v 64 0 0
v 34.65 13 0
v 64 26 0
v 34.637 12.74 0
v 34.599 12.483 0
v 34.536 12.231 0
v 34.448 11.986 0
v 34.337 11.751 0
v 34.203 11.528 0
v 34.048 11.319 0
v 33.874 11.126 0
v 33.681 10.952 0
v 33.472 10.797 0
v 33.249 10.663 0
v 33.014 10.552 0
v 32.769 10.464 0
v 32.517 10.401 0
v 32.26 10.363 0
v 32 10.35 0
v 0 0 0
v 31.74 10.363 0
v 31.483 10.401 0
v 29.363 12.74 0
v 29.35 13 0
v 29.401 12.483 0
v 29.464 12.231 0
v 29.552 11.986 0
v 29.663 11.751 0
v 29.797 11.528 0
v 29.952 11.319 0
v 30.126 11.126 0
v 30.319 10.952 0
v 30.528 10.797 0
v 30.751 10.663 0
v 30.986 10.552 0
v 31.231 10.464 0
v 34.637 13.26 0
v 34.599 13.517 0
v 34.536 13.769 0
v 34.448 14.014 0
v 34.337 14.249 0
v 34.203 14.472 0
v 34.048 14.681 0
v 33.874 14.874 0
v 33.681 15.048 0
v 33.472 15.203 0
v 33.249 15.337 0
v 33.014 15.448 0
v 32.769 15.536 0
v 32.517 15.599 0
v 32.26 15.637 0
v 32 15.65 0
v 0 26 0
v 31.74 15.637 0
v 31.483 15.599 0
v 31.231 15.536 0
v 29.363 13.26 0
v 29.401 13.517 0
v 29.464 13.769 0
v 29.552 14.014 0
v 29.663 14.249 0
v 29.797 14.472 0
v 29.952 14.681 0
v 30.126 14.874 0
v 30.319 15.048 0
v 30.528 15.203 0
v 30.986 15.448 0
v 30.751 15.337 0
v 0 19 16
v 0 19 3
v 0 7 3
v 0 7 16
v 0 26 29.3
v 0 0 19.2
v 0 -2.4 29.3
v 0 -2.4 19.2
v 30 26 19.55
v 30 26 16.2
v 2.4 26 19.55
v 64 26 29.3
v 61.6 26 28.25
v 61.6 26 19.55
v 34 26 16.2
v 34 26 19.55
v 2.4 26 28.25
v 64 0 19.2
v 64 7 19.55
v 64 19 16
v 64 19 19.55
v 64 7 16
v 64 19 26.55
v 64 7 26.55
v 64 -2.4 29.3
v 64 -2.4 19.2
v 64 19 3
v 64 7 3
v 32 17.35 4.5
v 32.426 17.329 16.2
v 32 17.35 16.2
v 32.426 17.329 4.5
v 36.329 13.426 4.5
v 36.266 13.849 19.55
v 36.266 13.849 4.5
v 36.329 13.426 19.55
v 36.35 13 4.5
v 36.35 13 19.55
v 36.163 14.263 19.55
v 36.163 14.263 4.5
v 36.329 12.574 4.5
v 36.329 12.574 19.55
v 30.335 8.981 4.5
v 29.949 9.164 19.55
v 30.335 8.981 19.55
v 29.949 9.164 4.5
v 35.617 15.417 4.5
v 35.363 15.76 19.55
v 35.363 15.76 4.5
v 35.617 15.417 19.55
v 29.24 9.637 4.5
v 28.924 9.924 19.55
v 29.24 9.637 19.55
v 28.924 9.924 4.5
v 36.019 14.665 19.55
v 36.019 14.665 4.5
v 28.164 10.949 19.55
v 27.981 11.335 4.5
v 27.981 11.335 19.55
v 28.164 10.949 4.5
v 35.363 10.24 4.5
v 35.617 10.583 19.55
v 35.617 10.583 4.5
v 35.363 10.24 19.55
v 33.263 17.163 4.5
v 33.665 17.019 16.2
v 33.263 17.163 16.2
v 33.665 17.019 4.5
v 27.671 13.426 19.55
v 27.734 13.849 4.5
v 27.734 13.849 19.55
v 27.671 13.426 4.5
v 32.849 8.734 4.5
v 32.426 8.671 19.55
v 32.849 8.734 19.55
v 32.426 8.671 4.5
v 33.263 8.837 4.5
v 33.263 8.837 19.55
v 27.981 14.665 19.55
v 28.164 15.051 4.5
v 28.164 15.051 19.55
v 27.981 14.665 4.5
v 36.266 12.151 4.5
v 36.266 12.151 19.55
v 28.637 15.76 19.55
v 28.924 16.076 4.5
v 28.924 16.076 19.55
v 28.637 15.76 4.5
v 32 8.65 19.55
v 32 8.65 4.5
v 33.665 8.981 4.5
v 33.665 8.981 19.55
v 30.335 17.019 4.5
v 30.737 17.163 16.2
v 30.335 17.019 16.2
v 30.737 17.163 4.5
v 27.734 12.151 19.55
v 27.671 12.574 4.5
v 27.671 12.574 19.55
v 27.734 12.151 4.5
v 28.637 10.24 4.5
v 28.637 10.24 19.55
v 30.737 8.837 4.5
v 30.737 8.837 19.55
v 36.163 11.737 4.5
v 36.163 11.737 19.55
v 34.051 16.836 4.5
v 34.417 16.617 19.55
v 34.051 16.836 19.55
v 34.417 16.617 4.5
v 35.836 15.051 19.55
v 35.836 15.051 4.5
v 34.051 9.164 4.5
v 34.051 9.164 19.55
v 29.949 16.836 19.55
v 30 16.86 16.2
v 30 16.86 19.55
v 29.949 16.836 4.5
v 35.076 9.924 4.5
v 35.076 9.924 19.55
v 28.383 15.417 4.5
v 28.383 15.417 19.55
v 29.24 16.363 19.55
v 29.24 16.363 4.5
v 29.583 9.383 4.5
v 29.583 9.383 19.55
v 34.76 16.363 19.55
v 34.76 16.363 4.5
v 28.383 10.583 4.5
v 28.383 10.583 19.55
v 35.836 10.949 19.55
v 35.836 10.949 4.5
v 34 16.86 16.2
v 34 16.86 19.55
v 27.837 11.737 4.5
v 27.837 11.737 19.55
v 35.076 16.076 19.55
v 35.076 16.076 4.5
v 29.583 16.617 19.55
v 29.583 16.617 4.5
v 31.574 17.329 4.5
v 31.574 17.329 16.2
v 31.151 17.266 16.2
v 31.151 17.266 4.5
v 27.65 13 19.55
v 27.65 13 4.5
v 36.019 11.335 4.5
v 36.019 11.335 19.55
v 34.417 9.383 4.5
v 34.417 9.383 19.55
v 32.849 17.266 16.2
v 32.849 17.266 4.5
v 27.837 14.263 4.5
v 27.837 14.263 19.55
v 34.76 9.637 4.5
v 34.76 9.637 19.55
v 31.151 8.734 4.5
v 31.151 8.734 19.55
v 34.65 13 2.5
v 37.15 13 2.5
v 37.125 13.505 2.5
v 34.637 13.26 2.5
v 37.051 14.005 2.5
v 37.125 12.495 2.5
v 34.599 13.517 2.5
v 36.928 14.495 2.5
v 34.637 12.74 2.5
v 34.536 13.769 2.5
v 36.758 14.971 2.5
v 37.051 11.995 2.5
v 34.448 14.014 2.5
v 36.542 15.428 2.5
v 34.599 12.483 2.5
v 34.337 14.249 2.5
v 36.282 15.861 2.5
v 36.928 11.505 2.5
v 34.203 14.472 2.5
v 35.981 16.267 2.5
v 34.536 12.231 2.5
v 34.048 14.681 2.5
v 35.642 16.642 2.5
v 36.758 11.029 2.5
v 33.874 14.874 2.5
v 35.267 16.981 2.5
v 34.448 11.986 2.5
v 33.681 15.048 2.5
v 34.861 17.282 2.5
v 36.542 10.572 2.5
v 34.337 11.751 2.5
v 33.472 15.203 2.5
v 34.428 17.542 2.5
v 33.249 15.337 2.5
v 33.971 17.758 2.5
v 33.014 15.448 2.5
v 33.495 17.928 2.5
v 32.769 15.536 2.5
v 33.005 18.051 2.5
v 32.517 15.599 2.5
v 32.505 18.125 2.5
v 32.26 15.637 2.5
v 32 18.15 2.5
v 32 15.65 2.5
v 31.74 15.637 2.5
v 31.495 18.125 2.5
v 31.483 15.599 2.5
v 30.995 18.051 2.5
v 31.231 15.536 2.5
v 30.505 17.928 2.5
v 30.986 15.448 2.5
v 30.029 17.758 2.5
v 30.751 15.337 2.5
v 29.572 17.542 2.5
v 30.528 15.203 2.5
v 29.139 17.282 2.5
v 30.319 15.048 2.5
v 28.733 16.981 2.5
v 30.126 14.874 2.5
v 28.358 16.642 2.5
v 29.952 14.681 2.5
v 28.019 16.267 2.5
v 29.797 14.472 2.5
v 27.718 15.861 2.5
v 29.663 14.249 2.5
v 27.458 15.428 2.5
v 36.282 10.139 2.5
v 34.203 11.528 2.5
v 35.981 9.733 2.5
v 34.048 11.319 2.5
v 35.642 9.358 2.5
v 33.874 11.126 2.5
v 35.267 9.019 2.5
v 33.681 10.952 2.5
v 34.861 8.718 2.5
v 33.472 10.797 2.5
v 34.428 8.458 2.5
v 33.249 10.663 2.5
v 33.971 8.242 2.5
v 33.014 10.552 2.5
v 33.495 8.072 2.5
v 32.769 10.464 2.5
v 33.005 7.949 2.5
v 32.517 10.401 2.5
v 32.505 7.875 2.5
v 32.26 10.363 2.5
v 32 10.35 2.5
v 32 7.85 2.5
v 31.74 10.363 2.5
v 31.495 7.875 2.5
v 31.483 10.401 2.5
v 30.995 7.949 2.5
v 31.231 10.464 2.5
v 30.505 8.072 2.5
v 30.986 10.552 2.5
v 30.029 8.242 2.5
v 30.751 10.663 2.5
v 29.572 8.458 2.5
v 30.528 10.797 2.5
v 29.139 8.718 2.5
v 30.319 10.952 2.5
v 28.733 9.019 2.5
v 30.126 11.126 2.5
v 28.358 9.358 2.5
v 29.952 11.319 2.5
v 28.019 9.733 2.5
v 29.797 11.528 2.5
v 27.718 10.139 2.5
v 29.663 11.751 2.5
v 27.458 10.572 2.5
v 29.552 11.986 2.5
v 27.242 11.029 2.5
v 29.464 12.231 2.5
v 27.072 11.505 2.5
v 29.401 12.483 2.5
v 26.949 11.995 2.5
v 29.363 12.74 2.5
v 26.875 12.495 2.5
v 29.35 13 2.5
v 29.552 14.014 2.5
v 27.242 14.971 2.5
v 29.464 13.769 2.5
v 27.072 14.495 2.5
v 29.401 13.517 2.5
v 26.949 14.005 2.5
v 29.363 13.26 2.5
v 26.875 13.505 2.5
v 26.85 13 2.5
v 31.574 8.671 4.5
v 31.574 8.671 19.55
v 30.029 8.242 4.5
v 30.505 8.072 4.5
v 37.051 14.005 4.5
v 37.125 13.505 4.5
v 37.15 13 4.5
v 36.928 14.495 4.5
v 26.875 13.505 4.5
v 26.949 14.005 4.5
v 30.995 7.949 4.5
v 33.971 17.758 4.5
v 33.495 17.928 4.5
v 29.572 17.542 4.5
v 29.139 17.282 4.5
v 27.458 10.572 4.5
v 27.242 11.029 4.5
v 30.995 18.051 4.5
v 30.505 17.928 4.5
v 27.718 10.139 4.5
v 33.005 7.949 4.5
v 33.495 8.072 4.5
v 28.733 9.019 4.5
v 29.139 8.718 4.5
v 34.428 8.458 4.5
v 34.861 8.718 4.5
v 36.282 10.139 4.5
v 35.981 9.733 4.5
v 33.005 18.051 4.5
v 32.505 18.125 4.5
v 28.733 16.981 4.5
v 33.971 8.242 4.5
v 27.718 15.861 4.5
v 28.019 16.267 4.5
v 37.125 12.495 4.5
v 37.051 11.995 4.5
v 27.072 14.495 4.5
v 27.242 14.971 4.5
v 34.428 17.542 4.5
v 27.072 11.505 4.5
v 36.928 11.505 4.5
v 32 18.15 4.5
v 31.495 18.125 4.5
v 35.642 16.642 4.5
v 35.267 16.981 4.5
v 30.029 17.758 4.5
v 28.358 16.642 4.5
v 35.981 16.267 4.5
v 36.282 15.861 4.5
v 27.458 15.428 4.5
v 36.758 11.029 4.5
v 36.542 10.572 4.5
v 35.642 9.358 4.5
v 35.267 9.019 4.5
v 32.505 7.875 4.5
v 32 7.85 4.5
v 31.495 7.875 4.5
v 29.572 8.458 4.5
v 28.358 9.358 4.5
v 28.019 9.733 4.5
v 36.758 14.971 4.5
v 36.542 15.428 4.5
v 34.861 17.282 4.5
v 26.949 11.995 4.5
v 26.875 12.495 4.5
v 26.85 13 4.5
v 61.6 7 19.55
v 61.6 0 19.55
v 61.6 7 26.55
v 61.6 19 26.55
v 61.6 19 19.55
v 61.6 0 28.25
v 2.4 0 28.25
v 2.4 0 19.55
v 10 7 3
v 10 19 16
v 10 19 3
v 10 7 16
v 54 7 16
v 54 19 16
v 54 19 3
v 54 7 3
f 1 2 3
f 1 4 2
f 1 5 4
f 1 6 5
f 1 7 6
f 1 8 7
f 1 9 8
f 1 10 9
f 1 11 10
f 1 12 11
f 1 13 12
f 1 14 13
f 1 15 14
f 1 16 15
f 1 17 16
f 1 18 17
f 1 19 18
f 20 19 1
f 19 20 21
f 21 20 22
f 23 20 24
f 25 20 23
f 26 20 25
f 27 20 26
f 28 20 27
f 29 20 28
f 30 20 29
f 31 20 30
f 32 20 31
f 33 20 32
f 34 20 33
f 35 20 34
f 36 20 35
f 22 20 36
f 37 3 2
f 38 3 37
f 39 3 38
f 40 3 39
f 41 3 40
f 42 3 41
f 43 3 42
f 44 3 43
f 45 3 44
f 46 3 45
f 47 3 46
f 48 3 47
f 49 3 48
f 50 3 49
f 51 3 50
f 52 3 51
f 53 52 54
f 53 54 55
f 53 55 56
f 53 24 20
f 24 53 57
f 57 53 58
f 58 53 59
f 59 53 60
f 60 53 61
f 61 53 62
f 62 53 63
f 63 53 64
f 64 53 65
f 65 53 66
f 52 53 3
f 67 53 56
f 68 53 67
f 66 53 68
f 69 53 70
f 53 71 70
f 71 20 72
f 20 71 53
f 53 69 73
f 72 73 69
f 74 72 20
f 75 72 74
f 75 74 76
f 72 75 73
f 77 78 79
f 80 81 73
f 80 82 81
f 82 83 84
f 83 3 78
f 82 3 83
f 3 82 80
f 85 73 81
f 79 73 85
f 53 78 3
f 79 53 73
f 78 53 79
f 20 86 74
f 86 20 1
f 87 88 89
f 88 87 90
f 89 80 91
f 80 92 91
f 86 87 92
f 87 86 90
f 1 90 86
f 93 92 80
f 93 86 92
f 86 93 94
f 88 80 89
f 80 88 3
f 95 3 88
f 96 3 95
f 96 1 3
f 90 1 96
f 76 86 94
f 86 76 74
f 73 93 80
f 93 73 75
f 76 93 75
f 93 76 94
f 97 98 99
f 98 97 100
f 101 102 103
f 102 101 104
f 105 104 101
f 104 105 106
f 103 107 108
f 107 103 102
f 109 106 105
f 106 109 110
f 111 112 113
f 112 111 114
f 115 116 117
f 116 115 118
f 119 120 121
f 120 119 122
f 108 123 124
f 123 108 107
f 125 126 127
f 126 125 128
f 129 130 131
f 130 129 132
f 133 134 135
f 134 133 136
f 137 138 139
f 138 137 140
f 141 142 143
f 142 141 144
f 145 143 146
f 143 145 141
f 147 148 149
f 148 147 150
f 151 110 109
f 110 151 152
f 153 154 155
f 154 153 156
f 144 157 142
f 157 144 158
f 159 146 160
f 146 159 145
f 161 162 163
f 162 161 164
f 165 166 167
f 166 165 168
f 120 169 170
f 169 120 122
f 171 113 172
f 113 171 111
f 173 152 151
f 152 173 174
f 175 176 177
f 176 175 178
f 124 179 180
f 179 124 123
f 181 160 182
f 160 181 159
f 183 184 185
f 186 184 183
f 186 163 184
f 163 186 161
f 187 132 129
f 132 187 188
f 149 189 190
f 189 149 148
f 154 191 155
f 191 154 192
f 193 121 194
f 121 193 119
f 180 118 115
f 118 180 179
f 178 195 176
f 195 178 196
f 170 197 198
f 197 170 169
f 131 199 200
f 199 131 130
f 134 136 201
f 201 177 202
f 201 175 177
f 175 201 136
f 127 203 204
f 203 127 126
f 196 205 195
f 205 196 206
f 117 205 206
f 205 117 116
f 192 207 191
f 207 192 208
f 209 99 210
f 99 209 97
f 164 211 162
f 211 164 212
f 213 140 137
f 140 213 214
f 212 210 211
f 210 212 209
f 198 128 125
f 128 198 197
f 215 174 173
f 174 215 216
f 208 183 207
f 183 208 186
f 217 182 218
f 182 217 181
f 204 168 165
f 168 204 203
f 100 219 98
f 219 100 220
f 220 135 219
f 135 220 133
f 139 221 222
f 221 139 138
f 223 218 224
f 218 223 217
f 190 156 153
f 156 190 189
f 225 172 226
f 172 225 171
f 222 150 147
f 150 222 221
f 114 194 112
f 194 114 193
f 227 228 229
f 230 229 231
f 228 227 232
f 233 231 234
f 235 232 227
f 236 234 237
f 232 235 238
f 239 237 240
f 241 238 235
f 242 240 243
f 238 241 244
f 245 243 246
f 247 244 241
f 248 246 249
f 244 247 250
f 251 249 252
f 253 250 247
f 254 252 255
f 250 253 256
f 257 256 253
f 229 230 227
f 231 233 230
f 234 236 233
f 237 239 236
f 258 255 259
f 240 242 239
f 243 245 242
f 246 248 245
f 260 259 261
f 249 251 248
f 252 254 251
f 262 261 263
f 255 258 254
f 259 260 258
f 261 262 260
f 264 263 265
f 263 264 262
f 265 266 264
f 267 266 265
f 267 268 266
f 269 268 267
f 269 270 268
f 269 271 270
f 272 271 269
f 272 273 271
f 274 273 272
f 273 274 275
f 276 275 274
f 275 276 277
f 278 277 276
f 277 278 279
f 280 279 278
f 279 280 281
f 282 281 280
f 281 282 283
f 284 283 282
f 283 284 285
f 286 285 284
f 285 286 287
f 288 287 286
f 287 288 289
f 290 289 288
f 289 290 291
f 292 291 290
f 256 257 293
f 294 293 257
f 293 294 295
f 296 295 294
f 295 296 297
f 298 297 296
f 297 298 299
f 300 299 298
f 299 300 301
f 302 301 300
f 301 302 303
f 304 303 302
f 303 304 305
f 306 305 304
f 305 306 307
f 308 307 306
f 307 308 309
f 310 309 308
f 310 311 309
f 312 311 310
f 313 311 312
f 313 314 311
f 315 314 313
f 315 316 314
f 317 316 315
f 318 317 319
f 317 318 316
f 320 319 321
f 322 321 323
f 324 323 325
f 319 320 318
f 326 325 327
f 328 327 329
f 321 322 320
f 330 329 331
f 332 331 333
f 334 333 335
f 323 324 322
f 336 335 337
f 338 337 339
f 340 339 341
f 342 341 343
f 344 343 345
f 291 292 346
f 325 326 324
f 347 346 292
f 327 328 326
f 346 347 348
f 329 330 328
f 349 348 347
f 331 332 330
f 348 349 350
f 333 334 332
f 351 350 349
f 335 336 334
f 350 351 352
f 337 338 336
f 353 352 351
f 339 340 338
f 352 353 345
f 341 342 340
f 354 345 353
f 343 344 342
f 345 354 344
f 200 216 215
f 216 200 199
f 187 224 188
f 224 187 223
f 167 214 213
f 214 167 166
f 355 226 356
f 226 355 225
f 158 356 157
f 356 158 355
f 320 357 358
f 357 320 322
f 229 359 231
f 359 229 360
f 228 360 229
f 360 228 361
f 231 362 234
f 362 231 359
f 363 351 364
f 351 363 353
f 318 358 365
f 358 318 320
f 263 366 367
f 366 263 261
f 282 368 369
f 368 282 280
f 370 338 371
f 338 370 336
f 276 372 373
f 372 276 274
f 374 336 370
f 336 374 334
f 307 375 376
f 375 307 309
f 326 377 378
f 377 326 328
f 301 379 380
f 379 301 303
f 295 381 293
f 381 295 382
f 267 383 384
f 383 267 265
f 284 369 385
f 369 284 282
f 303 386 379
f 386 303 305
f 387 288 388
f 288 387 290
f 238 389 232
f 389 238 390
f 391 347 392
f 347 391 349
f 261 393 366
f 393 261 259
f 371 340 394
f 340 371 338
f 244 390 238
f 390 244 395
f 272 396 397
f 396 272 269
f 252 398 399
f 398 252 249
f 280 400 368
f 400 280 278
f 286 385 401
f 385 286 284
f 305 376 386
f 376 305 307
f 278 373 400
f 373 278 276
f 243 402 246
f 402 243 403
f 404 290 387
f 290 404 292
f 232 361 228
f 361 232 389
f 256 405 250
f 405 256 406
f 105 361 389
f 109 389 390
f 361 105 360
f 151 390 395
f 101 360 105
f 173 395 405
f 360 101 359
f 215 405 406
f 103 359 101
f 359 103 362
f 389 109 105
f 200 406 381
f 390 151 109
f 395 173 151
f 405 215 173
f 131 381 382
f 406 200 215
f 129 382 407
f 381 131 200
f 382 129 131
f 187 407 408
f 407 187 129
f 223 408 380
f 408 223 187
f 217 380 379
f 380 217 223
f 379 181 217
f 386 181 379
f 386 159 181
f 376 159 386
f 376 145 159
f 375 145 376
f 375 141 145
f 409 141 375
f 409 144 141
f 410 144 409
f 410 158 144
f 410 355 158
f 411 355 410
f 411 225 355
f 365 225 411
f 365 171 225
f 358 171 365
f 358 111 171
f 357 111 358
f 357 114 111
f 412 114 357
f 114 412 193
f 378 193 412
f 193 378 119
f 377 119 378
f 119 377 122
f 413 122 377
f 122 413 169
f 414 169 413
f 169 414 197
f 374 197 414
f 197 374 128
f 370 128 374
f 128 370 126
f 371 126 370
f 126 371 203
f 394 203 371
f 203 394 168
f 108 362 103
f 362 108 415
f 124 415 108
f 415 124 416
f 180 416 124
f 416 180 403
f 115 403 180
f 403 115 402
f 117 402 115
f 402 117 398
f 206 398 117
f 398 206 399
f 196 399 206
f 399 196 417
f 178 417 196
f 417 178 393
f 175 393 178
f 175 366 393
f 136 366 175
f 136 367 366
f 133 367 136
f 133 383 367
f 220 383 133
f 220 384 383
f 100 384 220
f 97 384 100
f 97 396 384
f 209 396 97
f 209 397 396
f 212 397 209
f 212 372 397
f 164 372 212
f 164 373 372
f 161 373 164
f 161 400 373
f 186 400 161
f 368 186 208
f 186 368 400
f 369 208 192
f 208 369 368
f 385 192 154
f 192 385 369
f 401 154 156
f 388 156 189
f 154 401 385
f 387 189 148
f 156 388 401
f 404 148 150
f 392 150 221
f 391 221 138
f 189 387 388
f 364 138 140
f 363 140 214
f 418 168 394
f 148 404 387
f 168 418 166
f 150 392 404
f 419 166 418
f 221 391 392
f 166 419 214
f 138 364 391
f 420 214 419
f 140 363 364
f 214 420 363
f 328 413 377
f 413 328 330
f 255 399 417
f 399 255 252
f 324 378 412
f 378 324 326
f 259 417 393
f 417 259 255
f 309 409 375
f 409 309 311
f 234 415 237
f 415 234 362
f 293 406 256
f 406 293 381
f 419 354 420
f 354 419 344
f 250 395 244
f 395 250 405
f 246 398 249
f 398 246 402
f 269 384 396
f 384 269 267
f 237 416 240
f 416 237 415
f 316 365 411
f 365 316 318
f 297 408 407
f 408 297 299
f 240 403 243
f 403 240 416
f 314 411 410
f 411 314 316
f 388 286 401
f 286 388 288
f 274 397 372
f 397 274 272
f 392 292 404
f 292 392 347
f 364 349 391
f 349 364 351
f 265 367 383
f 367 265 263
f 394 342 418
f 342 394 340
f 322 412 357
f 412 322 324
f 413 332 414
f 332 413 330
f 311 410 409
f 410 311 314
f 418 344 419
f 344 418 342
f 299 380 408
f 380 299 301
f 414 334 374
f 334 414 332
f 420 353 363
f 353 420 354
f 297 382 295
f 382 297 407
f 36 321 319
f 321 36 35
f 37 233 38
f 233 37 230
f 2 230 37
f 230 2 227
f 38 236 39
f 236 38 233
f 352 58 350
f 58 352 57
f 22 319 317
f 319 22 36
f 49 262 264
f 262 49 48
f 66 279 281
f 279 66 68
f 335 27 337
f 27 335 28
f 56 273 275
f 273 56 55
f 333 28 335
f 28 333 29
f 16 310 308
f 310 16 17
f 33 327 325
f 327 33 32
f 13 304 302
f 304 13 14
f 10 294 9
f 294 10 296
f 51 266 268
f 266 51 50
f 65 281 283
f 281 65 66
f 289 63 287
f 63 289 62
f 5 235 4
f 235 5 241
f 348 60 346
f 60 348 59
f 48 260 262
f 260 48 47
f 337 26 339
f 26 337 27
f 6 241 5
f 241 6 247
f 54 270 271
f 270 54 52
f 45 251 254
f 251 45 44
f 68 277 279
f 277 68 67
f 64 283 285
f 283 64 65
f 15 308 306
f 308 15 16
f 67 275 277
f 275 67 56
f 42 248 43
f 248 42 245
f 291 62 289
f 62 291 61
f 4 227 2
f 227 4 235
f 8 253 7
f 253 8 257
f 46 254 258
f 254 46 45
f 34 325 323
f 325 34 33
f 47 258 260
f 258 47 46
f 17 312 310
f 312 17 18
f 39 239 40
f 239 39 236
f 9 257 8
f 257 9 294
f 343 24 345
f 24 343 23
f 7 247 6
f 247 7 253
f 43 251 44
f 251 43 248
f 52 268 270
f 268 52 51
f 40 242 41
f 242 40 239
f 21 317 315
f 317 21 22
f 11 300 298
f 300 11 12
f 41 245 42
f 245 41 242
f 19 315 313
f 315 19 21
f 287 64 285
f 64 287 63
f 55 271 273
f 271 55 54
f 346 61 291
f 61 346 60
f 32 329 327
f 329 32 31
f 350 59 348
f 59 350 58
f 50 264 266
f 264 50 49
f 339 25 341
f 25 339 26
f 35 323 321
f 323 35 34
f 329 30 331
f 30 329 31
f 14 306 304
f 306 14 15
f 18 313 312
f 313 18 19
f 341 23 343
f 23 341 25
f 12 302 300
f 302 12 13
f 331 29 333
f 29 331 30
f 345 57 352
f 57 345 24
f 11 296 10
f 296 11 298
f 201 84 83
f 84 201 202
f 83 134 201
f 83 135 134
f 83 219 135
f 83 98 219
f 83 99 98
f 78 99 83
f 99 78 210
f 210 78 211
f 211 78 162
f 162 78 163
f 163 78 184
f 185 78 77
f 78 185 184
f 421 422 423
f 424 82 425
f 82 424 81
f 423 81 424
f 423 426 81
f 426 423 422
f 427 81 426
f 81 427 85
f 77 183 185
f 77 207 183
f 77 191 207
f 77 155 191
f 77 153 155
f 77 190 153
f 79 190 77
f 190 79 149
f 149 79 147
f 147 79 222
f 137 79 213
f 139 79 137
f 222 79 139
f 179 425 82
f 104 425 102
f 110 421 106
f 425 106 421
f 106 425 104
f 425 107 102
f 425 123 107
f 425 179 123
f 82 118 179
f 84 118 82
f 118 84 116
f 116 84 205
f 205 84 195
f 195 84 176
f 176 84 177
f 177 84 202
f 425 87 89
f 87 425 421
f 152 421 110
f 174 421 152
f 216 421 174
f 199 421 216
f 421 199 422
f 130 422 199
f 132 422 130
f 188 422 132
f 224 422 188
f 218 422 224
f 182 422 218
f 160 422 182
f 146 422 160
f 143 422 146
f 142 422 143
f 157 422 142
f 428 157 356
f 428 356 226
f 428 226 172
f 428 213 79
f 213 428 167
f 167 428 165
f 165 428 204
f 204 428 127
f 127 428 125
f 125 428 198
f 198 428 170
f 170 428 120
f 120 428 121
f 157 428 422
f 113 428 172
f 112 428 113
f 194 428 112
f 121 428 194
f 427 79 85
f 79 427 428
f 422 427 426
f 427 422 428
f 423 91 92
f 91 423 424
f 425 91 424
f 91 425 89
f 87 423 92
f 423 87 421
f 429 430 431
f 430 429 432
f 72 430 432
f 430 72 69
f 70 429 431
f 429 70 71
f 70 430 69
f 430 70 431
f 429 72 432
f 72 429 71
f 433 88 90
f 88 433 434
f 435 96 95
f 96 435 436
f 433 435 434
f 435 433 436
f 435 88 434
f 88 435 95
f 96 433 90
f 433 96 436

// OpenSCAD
// power_bridge.scad —— WiFi 开机器一体化外壳（微型电磁铁版）
// ================================================================
// 用法：
//   1. 装 OpenSCAD（免费开源：openscad.org）
//   2. 实测你的笔记本后修改下方参数（每个参数都有注释教你怎么量）
//   3. F5 预览 → F6 渲染 → 导出 STL → 切片打印
// 材料建议：PLA，0.2mm 层高，3 层壁，20% 填充，无需支撑
// 公差：孔/槽尺寸已含 0.35mm 配合公差，首版打印后按松紧微调 tol
//
// 设计要点：桥形结构 = 天然机械限位
//   电磁铁竖装在桥体中央，推杆只有上下一个运动自由度，
//   物理上不存在横扫/侧滑，是执行器安全的终极形态。

$fn = 64;

/* ====== 1. 桥体尺寸（拿直尺实测后修改） ====== */
span   = 46;   // 两脚柱内侧跨距：电源键宽度 + 两侧各留 ≥8mm 落胶面
depth  = 26;   // 前后深度：覆盖按键区即可
foot_h = 16;   // 脚柱高：跨过键盘面板与键面的高度差 + 3mm 余量
foot_w = 9;    // 脚柱宽度
top_t  = 3.2;  // 顶板厚度（3 层壁）

/* ====== 2. 电磁铁参数（到手后用卡尺实测核对） ====== */
// 型号 ZYE1-P08/15：筒身 Φ8×15.5mm，一端带法兰
sol_d    = 8.0;   // 筒身直径
sol_l    = 15.5;  // 总长（含法兰）
flange_d = 9.6;   // 法兰直径（法兰朝下，挂在筒底沉槽上）
push_d   = 3.9;   // 推杆直径

/* ====== 3. ESP32-S3 托盘（按你的板实测） ====== */
esp_l  = 55;   // 板长（含 USB 口那端）
esp_w  = 26;   // 板宽
esp_h  = 7;    // 板厚 + 正面元件最高点
usb_w  = 12;   // USB 口开槽宽
usb_h  = 7;    // USB 口开槽高

/* ====== 4. 公差与壁厚 ====== */
tol    = 0.35;  // FDM 配合公差：装不进就调大，太松就调小
wall_t = 2.4;   // 筒壁/托盘墙厚（3 层壁）

/* ====== 派生尺寸，勿改 ====== */
total_l  = span + 2 * foot_w;   // 桥体总长
cx       = total_l / 2;         // 电磁铁中心 x（跨中 = 键中心上方）
cy       = depth / 2;
tube_bot = 2.5;                 // 筒底离键面的净空（推杆行程 + 键程的余量）
gap_h    = foot_h - tube_bot;   // 筒身露出顶板以下的高度

difference() {
  union() {
    /* ---- 两只脚柱 ---- */
    cube([foot_w, depth, foot_h]);
    translate([total_l - foot_w, 0, 0])
      cube([foot_w, depth, foot_h]);

    /* ---- 顶板（横跨） ---- */
    cube([total_l, depth, foot_h + top_t]);

    /* ---- 电磁铁外筒（挂在顶板下方，跨中） ---- */
    translate([cx, cy, tube_bot])
      cylinder(d = sol_d + 2 * wall_t + 1, h = gap_h);

    /* ---- ESP32-S3 托盘（叠在顶板上方，占整桥长） ---- */
    translate([0, depth - esp_w - wall_t, foot_h + top_t])
      cube([total_l, esp_w + wall_t, esp_h + wall_t + 2 * tol]);
  }

  /* ---- 电磁铁筒身内腔（从筒底向上贯穿顶板，电磁铁从上往下插入） ---- */
  translate([cx, cy, tube_bot])
    cylinder(d = sol_d + 2 * tol, h = foot_h + top_t - tube_bot + 2);

  /* ---- 法兰沉槽（电磁铁法兰坐在这里，整支重量由收口承担） ---- */
  translate([cx, cy, tube_bot])
    cylinder(d = flange_d + 2 * tol, h = 2.0);

  /* ---- 推杆出口（筒底收口，兼导向） ---- */
  translate([cx, cy, -0.5])
    cylinder(d = push_d + 1.4, h = tube_bot + 3);

  /* ---- 电磁铁顶部引线槽（向上引出到托盘区） ---- */
  translate([cx - 2, cy - 2, foot_h + top_t - 3])
    cube([4, esp_w + wall_t - depth/2 + 4, 5]);

  /* ---- ESP 托盘内腔（挖空） ---- */
  translate([wall_t, depth - esp_w, foot_h + top_t + tol])
    cube([total_l - 2 * wall_t, esp_w + 1, esp_h + 2 * tol + 1]);

  /* ---- USB 口过线槽（托盘 x+ 端墙，朝外） ---- */
  translate([total_l - wall_t - 1, cy - usb_w / 2, foot_h + top_t + tol])
    cube([wall_t + 4, usb_w, usb_h]);

  /* ---- 脚柱减重孔（省料，不影响强度） ---- */
  translate([-1, cy - 6, 3])
    cube([foot_w + 2, 12, foot_h - 3]);
  translate([total_l - foot_w - 1, cy - 6, 3])
    cube([foot_w + 2, 12, foot_h - 3]);
}

/* ---- 使用说明（渲染时注释区不影响模型） ----
 * 1. 安装顺序：纳米胶贴两脚柱底 → 桥体跨过电源键 → 电磁铁从顶板
 *    上方插入（法兰朝下，坐在筒底沉槽）→ 推杆顶端正对键帽中心
 *    → ESP32-S3 放入托盘（USB 口朝外）→ 接线见 README
 * 2. 推杆顶端务必贴一小块硅胶垫/海绵，保护键帽、消敲击声
 * 3. 桥下净空 tube_bot = 2.5mm：推杆行程 2mm + 键程 1.5mm 若压不到底，
 *    把 foot_h 加大 1mm 重打；压太深则相反
 * 4. 平时人手按键：桥体横跨在键上方，手指从侧面/后方伸入按键；
 *    若挡手，把 depth 或 esp_w 调小、桥往键位上方挪
 * 5. 想换舵机凸轮版：把电磁铁筒换成"舵机横仓"（内腔 23×13×13，
 *    输出轴竖直朝下穿顶板，盘缘对键），原理相同
 */
